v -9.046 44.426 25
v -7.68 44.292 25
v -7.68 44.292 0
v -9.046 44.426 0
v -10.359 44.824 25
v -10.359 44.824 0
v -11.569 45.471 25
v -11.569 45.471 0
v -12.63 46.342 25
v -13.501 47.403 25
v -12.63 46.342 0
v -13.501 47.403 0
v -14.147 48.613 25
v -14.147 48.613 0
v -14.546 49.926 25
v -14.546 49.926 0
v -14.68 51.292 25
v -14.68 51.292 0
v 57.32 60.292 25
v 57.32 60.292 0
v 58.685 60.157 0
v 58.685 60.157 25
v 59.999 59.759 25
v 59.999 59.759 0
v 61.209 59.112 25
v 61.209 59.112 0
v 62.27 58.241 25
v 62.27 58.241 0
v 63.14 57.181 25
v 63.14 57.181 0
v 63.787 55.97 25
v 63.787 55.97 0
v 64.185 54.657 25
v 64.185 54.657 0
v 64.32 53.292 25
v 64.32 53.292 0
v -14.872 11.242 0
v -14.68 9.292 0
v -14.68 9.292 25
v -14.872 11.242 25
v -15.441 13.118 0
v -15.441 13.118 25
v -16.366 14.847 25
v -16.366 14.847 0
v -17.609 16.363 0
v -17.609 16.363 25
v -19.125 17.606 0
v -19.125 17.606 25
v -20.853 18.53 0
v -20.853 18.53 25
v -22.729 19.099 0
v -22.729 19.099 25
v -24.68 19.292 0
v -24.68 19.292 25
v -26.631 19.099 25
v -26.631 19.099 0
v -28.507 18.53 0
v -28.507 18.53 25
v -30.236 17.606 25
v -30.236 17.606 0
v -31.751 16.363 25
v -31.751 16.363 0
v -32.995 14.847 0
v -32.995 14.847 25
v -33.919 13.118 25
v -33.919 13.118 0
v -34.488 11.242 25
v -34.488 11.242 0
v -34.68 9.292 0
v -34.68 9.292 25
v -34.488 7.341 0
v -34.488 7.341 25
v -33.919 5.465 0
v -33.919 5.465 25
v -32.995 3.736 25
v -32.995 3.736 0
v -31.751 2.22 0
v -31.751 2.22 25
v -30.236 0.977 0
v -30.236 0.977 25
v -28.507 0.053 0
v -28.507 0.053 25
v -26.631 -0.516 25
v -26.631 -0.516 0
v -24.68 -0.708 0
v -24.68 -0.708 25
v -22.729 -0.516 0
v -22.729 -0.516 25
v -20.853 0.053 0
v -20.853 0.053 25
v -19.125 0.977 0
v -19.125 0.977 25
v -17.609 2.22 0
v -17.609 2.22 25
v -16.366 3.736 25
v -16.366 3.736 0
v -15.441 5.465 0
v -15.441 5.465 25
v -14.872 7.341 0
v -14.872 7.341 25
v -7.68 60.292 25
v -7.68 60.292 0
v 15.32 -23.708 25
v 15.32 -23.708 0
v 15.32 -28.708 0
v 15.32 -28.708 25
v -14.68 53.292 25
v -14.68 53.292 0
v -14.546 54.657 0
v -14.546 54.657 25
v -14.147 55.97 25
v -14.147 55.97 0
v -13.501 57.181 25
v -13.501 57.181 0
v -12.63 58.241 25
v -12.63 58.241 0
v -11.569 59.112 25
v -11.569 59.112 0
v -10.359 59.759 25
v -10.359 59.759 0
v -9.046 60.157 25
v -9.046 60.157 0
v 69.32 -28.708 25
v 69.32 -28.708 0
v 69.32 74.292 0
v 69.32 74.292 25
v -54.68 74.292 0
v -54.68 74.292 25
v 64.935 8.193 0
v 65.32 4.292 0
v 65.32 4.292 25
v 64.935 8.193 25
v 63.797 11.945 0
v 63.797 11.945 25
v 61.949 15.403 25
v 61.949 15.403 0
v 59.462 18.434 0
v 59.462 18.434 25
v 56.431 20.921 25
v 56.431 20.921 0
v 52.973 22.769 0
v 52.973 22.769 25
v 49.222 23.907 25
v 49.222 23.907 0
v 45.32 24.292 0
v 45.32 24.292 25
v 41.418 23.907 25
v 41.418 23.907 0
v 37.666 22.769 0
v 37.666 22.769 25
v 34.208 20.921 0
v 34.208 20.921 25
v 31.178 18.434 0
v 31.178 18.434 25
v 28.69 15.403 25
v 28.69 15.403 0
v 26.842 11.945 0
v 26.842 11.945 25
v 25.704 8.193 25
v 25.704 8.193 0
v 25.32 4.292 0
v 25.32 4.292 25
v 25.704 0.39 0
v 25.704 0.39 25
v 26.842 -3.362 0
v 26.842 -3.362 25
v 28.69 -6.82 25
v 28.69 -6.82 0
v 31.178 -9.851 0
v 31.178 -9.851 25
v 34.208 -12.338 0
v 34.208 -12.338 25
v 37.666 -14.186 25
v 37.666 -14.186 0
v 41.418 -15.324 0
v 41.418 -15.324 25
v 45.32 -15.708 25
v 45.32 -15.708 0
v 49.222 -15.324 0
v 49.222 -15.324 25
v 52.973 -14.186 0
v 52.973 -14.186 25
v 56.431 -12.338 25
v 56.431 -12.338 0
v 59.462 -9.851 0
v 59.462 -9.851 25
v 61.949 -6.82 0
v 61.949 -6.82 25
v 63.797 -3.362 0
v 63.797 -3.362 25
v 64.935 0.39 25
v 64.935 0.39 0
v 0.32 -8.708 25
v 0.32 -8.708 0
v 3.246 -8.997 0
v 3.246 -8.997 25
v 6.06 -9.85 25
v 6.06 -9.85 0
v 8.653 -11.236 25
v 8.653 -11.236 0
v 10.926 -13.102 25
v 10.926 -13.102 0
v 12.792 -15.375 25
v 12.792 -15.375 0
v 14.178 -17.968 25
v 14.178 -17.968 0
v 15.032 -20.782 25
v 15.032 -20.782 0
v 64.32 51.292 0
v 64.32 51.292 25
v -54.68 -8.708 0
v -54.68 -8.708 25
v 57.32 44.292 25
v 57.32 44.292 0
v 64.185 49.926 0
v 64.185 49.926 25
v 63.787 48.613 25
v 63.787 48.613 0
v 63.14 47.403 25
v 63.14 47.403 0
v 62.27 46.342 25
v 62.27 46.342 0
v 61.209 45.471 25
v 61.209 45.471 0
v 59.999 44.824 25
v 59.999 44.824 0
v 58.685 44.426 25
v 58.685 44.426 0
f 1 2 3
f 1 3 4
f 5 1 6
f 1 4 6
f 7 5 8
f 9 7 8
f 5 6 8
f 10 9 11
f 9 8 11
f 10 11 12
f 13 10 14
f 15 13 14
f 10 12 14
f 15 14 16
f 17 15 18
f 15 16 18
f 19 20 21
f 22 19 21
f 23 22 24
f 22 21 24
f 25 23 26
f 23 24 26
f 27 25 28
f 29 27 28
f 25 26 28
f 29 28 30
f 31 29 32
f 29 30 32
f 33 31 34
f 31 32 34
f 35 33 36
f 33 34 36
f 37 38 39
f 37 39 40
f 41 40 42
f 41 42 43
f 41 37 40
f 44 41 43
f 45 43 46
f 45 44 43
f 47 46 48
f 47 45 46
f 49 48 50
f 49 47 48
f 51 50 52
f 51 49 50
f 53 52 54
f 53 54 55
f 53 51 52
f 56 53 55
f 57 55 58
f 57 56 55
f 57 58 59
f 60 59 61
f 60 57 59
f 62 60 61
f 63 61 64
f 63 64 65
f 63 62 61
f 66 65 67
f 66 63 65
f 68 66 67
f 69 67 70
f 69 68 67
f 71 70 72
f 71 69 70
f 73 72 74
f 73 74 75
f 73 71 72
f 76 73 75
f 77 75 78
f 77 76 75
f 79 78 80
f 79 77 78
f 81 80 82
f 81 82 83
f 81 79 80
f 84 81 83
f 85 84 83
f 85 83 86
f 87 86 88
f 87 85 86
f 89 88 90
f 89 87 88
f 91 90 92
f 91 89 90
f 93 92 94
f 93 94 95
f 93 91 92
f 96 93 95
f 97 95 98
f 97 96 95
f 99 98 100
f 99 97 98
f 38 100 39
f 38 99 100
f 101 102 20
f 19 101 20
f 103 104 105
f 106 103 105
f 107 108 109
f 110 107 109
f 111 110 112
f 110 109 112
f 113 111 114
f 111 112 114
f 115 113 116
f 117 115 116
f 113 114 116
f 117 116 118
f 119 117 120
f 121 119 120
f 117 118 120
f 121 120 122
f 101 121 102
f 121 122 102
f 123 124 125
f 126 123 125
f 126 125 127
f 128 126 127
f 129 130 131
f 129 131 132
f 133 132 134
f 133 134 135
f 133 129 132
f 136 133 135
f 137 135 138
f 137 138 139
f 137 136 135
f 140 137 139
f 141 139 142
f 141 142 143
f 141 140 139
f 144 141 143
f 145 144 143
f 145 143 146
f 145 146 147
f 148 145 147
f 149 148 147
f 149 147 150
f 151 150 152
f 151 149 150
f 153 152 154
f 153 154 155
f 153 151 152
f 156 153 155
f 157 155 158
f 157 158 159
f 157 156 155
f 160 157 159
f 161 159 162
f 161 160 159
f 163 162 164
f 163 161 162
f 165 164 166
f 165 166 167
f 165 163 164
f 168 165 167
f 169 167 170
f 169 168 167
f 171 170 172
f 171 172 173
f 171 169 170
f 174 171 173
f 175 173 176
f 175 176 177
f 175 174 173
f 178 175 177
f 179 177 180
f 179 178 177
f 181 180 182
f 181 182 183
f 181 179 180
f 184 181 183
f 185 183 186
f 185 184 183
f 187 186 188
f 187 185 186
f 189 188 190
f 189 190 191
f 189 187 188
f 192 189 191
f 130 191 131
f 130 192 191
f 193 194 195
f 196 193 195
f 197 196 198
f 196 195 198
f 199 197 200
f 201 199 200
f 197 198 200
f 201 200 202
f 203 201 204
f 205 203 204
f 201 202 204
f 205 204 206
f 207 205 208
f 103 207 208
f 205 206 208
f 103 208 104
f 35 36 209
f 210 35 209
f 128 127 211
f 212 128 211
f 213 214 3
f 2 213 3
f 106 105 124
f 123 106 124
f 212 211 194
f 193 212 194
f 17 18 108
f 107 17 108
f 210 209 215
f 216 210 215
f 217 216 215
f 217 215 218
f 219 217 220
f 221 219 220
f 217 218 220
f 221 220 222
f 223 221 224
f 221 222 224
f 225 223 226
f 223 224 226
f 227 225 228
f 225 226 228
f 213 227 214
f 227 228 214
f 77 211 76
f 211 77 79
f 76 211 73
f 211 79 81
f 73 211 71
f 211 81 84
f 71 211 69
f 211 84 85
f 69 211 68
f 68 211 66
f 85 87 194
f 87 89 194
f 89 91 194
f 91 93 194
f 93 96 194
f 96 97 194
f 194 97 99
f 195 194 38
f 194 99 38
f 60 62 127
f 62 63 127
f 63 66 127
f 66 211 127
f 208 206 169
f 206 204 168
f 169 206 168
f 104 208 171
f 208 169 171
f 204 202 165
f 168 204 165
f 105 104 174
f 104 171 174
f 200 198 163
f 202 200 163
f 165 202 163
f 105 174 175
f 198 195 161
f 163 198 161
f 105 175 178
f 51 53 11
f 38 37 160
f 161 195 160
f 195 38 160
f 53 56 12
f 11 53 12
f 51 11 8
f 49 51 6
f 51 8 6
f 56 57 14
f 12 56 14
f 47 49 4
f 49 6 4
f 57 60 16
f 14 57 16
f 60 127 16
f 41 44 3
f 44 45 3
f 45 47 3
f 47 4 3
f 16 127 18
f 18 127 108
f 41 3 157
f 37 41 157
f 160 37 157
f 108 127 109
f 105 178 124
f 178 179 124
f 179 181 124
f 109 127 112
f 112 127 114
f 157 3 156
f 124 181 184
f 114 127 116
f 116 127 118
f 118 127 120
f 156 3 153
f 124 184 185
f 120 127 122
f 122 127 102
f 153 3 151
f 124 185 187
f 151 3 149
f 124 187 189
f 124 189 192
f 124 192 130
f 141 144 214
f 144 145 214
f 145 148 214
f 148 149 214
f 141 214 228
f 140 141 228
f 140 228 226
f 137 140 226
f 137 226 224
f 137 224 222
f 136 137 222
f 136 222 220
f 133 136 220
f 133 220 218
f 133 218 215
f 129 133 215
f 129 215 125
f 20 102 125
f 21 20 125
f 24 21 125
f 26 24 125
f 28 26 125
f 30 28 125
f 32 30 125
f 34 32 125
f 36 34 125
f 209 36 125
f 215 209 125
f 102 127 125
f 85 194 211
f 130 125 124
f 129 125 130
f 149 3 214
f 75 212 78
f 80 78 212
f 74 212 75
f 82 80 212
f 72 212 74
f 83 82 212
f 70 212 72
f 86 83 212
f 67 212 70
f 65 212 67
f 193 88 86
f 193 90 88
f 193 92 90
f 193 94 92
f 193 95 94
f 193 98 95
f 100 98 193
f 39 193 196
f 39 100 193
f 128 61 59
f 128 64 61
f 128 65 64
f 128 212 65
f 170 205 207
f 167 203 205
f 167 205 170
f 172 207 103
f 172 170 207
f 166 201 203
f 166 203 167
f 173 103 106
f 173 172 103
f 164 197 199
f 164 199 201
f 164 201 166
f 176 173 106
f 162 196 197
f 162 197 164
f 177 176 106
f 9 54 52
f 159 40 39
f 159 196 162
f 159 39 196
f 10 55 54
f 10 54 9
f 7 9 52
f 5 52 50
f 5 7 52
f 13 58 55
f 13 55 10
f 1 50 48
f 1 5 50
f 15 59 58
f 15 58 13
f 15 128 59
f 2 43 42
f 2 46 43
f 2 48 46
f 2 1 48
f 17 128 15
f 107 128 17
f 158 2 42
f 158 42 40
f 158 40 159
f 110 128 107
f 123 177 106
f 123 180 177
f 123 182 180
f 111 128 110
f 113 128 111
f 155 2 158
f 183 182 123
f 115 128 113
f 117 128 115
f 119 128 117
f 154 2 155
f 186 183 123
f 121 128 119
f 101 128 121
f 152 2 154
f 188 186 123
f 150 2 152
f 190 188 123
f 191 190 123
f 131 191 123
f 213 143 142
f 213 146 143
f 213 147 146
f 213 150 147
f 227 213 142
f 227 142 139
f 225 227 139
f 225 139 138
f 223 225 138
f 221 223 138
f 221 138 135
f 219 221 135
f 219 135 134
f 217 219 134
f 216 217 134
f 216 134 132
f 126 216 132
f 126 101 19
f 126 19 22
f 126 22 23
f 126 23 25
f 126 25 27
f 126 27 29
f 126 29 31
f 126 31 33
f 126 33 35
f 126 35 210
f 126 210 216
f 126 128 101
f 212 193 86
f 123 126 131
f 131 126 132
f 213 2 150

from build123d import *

# Parameters (mm, degrees)
F0_R     = 10
F0_R_2   = 20
F1_DEPTH = 25
F2_DEPTH = 25
F3_DEPTH = 25
F4_DEPTH = 25
F5_DEPTH = 25


with BuildPart() as f1:
    # F0 (on Top) → F1 (new body)
    with BuildSketch(Plane.XY):
        with BuildLine():
            Line((69.319781, 74.291547), (-54.680219, 74.291547))
            Line((-54.680219, 74.291547), (-54.680219, -8.708453))
            Line((-54.680219, -8.708453), (0.319781, -8.708453))
            ThreePointArc((0.319781, -8.708453), (10.926383, -13.101851), (15.319781, -23.708453))
            Line((15.319781, -23.708453), (15.319781, -28.708453))
            Line((15.319781, -28.708453), (69.319781, -28.708453))
            Line((69.319781, -28.708453), (69.319781, 74.291547))
        make_face()
        with Locations((-24.680219, 9.291547)):
            Circle(F0_R, mode=Mode.SUBTRACT)
        with Locations((45.319781, 4.291547)):
            Circle(F0_R_2, mode=Mode.SUBTRACT)
        with BuildLine():
            ThreePointArc((-14.680219, 53.291547), (-12.629966, 58.241294), (-7.680219, 60.291547))
            Line((-7.680219, 60.291547), (57.319781, 60.291547))
            ThreePointArc((57.319781, 60.291547), (62.269529, 58.241294), (64.319781, 53.291547))
            Line((64.319781, 53.291547), (64.319781, 51.291547))
            ThreePointArc((64.319781, 51.291547), (62.269529, 46.341799), (57.319781, 44.291547))
            Line((57.319781, 44.291547), (-7.680219, 44.291547))
            ThreePointArc((-7.680219, 44.291547), (-12.629966, 46.341799), (-14.680219, 51.291547))
            Line((-14.680219, 51.291547), (-14.680219, 53.291547))
        make_face(mode=Mode.SUBTRACT)
    extrude(amount=F1_DEPTH)

    # F0 (on Top) → F2 (join)
    with BuildSketch(Plane.XY):
        with BuildLine():
            Line((69.319781, 74.291547), (-54.680219, 74.291547))
            Line((-54.680219, 74.291547), (-54.680219, -8.708453))
            Line((-54.680219, -8.708453), (0.319781, -8.708453))
            ThreePointArc((0.319781, -8.708453), (10.926383, -13.101851), (15.319781, -23.708453))
            Line((15.319781, -23.708453), (15.319781, -28.708453))
            Line((15.319781, -28.708453), (69.319781, -28.708453))
            Line((69.319781, -28.708453), (69.319781, 74.291547))
        make_face()
        with Locations((-24.680219, 9.291547)):
            Circle(F0_R, mode=Mode.SUBTRACT)
        with Locations((45.319781, 4.291547)):
            Circle(F0_R_2, mode=Mode.SUBTRACT)
        with BuildLine():
            ThreePointArc((-14.680219, 53.291547), (-12.629966, 58.241294), (-7.680219, 60.291547))
            Line((-7.680219, 60.291547), (57.319781, 60.291547))
            ThreePointArc((57.319781, 60.291547), (62.269529, 58.241294), (64.319781, 53.291547))
            Line((64.319781, 53.291547), (64.319781, 51.291547))
            ThreePointArc((64.319781, 51.291547), (62.269529, 46.341799), (57.319781, 44.291547))
            Line((57.319781, 44.291547), (-7.680219, 44.291547))
            ThreePointArc((-7.680219, 44.291547), (-12.629966, 46.341799), (-14.680219, 51.291547))
            Line((-14.680219, 51.291547), (-14.680219, 53.291547))
        make_face(mode=Mode.SUBTRACT)
    extrude(amount=F2_DEPTH)

    # F0 (on Top) → F3 (join)
    with BuildSketch(Plane.XY):
        with BuildLine():
            Line((69.319781, 74.291547), (-54.680219, 74.291547))
            Line((-54.680219, 74.291547), (-54.680219, -8.708453))
            Line((-54.680219, -8.708453), (0.319781, -8.708453))
            ThreePointArc((0.319781, -8.708453), (10.926383, -13.101851), (15.319781, -23.708453))
            Line((15.319781, -23.708453), (15.319781, -28.708453))
            Line((15.319781, -28.708453), (69.319781, -28.708453))
            Line((69.319781, -28.708453), (69.319781, 74.291547))
        make_face()
        with Locations((-24.680219, 9.291547)):
            Circle(F0_R, mode=Mode.SUBTRACT)
        with Locations((45.319781, 4.291547)):
            Circle(F0_R_2, mode=Mode.SUBTRACT)
        with BuildLine():
            ThreePointArc((-14.680219, 53.291547), (-12.629966, 58.241294), (-7.680219, 60.291547))
            Line((-7.680219, 60.291547), (57.319781, 60.291547))
            ThreePointArc((57.319781, 60.291547), (62.269529, 58.241294), (64.319781, 53.291547))
            Line((64.319781, 53.291547), (64.319781, 51.291547))
            ThreePointArc((64.319781, 51.291547), (62.269529, 46.341799), (57.319781, 44.291547))
            Line((57.319781, 44.291547), (-7.680219, 44.291547))
            ThreePointArc((-7.680219, 44.291547), (-12.629966, 46.341799), (-14.680219, 51.291547))
            Line((-14.680219, 51.291547), (-14.680219, 53.291547))
        make_face(mode=Mode.SUBTRACT)
    extrude(amount=F3_DEPTH)

    # F0 (on Top) → F4 (join)
    with BuildSketch(Plane.XY):
        with BuildLine():
            Line((69.319781, 74.291547), (-54.680219, 74.291547))
            Line((-54.680219, 74.291547), (-54.680219, -8.708453))
            Line((-54.680219, -8.708453), (0.319781, -8.708453))
            ThreePointArc((0.319781, -8.708453), (10.926383, -13.101851), (15.319781, -23.708453))
            Line((15.319781, -23.708453), (15.319781, -28.708453))
            Line((15.319781, -28.708453), (69.319781, -28.708453))
            Line((69.319781, -28.708453), (69.319781, 74.291547))
        make_face()
        with Locations((-24.680219, 9.291547)):
            Circle(F0_R, mode=Mode.SUBTRACT)
        with Locations((45.319781, 4.291547)):
            Circle(F0_R_2, mode=Mode.SUBTRACT)
        with BuildLine():
            ThreePointArc((-14.680219, 53.291547), (-12.629966, 58.241294), (-7.680219, 60.291547))
            Line((-7.680219, 60.291547), (57.319781, 60.291547))
            ThreePointArc((57.319781, 60.291547), (62.269529, 58.241294), (64.319781, 53.291547))
            Line((64.319781, 53.291547), (64.319781, 51.291547))
            ThreePointArc((64.319781, 51.291547), (62.269529, 46.341799), (57.319781, 44.291547))
            Line((57.319781, 44.291547), (-7.680219, 44.291547))
            ThreePointArc((-7.680219, 44.291547), (-12.629966, 46.341799), (-14.680219, 51.291547))
            Line((-14.680219, 51.291547), (-14.680219, 53.291547))
        make_face(mode=Mode.SUBTRACT)
    extrude(amount=F4_DEPTH)

    # F0 (on Top) → F5 (join)
    with BuildSketch(Plane.XY):
        with BuildLine():
            Line((69.319781, 74.291547), (-54.680219, 74.291547))
            Line((-54.680219, 74.291547), (-54.680219, -8.708453))
            Line((-54.680219, -8.708453), (0.319781, -8.708453))
            ThreePointArc((0.319781, -8.708453), (10.926383, -13.101851), (15.319781, -23.708453))
            Line((15.319781, -23.708453), (15.319781, -28.708453))
            Line((15.319781, -28.708453), (69.319781, -28.708453))
            Line((69.319781, -28.708453), (69.319781, 74.291547))
        make_face()
        with Locations((-24.680219, 9.291547)):
            Circle(F0_R, mode=Mode.SUBTRACT)
        with Locations((45.319781, 4.291547)):
            Circle(F0_R_2, mode=Mode.SUBTRACT)
        with BuildLine():
            ThreePointArc((-14.680219, 53.291547), (-12.629966, 58.241294), (-7.680219, 60.291547))
            Line((-7.680219, 60.291547), (57.319781, 60.291547))
            ThreePointArc((57.319781, 60.291547), (62.269529, 58.241294), (64.319781, 53.291547))
            Line((64.319781, 53.291547), (64.319781, 51.291547))
            ThreePointArc((64.319781, 51.291547), (62.269529, 46.341799), (57.319781, 44.291547))
            Line((57.319781, 44.291547), (-7.680219, 44.291547))
            ThreePointArc((-7.680219, 44.291547), (-12.629966, 46.341799), (-14.680219, 51.291547))
            Line((-14.680219, 51.291547), (-14.680219, 53.291547))
        make_face(mode=Mode.SUBTRACT)
    extrude(amount=F5_DEPTH)


solid = f1.part
